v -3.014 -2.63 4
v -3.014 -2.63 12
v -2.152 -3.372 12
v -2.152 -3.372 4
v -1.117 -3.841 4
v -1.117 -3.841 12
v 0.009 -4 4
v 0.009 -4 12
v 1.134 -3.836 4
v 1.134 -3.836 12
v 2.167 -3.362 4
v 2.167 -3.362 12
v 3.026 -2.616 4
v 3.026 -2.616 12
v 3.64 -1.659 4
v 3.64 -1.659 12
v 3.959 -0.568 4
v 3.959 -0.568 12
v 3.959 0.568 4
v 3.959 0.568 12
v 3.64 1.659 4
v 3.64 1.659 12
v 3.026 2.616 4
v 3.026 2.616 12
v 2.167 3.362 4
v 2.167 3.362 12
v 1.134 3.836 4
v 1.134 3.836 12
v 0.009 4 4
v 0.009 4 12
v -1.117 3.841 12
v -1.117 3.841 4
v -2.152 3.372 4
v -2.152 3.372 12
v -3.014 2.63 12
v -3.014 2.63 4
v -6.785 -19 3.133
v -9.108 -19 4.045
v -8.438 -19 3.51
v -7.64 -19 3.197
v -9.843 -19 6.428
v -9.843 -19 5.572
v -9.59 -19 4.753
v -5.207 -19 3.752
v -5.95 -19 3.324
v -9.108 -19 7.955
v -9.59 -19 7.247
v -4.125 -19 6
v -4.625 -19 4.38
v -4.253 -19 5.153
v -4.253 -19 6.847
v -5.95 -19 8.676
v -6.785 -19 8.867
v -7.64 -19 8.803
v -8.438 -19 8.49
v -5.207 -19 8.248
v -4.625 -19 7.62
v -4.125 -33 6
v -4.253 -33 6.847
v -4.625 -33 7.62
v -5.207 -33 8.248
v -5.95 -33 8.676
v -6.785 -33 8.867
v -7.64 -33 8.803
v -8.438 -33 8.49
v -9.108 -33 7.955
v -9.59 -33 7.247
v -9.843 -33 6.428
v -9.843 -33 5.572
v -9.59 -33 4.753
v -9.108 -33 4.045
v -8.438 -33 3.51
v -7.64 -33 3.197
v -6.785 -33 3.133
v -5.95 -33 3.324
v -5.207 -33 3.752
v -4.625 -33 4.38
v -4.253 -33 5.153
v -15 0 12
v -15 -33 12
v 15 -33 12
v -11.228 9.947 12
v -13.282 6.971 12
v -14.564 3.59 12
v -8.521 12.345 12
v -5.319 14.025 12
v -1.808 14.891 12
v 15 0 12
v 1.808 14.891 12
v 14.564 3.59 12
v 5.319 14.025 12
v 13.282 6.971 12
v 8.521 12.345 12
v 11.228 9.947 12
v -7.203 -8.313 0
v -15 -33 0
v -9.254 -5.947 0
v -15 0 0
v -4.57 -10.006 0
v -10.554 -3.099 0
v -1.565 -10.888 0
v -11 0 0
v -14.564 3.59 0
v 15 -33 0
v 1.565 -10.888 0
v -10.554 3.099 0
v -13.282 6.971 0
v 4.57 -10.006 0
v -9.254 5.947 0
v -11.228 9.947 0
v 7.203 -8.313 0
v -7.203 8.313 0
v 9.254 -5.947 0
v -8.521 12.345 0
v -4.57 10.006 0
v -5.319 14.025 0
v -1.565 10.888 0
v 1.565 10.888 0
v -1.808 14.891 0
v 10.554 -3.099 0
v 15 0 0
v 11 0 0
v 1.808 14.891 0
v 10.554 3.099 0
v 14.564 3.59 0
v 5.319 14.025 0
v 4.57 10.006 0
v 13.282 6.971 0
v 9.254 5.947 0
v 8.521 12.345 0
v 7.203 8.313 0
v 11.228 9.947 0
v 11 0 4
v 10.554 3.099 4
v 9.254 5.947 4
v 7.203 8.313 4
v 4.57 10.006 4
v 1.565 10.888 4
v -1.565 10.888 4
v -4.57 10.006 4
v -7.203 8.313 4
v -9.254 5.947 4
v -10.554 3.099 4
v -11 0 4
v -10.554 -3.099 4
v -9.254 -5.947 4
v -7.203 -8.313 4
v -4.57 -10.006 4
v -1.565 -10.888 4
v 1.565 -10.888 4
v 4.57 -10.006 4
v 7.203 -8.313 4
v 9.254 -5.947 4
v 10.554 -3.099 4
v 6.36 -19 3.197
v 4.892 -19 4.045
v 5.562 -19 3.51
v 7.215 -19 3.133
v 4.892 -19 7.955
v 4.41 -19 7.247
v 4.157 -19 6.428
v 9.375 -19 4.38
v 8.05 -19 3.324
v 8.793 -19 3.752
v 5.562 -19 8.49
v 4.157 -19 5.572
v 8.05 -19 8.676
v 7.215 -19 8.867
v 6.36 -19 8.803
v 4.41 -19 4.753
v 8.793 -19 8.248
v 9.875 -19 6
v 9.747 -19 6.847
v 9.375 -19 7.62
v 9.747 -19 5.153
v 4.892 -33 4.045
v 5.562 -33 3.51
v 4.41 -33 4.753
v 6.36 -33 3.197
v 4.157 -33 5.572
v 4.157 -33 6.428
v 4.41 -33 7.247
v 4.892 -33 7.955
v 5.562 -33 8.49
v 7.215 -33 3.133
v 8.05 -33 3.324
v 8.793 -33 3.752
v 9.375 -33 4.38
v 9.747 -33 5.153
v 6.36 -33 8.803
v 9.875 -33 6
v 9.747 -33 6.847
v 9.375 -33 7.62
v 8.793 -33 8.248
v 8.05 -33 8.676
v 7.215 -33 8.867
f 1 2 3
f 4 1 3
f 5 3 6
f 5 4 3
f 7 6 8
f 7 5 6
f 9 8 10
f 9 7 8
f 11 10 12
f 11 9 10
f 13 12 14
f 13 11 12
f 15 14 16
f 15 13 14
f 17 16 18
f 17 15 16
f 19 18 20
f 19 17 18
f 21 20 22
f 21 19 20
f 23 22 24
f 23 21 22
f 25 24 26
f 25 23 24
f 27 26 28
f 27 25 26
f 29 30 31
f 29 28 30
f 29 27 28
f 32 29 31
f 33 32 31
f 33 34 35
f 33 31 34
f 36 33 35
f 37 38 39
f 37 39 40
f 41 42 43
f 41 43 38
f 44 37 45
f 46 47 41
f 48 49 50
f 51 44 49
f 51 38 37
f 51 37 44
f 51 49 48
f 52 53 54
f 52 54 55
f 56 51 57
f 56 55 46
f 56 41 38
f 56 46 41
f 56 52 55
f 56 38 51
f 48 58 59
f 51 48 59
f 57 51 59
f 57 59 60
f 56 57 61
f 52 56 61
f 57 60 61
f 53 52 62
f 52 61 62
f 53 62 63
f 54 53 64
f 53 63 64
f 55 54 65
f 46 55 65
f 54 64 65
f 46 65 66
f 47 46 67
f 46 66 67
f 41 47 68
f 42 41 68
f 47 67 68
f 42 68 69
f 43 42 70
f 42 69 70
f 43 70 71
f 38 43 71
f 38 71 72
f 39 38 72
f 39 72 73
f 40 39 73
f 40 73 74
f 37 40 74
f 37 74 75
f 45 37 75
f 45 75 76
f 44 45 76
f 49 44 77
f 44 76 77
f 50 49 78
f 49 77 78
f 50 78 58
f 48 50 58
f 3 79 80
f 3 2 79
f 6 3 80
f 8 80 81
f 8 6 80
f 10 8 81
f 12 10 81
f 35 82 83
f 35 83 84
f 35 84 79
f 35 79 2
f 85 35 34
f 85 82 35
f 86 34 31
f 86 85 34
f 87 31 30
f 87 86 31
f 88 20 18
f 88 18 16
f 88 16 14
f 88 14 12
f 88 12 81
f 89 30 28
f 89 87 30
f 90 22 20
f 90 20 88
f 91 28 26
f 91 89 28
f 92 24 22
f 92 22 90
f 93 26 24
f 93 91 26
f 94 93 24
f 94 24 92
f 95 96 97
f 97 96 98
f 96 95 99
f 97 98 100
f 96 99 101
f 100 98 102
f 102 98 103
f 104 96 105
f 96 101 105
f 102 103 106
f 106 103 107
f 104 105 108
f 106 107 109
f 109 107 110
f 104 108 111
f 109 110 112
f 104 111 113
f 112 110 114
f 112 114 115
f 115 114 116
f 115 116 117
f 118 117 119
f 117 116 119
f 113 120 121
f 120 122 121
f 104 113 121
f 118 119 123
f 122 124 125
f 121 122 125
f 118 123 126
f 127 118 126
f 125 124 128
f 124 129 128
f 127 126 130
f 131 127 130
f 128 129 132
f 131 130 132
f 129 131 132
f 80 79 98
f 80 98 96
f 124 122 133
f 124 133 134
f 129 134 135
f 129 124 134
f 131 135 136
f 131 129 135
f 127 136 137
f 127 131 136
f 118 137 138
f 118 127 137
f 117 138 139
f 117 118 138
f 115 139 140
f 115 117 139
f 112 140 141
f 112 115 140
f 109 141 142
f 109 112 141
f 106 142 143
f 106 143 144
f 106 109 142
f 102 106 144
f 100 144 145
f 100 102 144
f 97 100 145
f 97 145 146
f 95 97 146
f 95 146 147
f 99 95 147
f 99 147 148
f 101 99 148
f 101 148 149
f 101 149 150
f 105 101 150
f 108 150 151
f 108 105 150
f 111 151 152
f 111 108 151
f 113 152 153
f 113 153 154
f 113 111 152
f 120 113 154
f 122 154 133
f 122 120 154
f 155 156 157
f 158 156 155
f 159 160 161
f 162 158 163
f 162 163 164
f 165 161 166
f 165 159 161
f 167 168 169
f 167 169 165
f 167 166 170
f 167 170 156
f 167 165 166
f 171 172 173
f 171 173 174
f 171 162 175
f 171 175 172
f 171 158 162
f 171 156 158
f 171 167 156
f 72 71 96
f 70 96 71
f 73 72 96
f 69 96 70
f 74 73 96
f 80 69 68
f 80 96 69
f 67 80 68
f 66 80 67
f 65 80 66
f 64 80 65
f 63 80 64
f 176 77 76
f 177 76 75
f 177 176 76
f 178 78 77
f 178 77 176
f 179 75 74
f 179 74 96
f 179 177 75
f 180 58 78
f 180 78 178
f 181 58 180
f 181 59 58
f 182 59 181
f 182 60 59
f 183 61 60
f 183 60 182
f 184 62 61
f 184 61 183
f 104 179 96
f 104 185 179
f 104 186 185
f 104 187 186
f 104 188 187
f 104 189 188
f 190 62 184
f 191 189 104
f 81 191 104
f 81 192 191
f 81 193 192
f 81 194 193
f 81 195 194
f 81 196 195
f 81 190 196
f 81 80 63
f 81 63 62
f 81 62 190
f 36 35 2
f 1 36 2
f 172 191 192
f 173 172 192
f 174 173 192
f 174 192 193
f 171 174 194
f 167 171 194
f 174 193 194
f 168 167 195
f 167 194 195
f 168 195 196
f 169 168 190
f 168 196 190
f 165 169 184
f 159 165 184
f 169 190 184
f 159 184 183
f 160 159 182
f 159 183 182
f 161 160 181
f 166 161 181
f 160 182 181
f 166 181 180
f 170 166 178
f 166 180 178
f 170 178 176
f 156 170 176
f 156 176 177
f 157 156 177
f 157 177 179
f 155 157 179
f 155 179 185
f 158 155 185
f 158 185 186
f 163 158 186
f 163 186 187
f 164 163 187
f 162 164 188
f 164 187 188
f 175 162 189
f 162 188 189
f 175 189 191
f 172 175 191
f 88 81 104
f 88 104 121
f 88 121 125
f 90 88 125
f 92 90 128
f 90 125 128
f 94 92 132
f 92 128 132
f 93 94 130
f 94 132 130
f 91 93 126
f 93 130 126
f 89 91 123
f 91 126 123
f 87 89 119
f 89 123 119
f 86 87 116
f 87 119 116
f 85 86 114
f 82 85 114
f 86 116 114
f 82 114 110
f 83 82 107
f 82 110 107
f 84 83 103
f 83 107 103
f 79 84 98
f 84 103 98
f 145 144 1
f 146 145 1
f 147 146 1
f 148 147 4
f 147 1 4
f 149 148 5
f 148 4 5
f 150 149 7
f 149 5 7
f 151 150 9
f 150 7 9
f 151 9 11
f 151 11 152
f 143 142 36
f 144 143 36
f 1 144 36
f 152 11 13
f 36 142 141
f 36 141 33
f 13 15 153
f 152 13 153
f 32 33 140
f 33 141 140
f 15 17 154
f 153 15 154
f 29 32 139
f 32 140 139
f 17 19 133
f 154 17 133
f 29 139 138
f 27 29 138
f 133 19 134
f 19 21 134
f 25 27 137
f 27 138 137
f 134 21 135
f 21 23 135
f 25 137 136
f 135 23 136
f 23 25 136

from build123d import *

# Parameters (mm, degrees)
SKETCH2_R           = 15
SKETCH2_R_2         = 11
BOSS_EXTRUDE1_DEPTH = 4
SKETCH3_R           = 15
SKETCH3_R_2         = 4
BOSS_EXTRUDE2_DEPTH = 8
BOSS_EXTRUDE5_DEPTH = 12
BOSS_EXTRUDE7_DEPTH = 8
SKETCH9_R           = 2.875
CUT_EXTRUDE1_DEPTH  = 14


with BuildPart() as part:
    # Sketch2 → Boss-Extrude1 (new body)
    with BuildSketch(Plane.XY):
        Circle(SKETCH2_R)
        Circle(SKETCH2_R_2, mode=Mode.SUBTRACT)
    extrude(amount=BOSS_EXTRUDE1_DEPTH)

    # Sketch3 → Boss-Extrude2 (add)
    with BuildSketch(Plane.XY.offset(4)):
        Circle(SKETCH3_R)
        Circle(SKETCH3_R_2, mode=Mode.SUBTRACT)
    extrude(amount=BOSS_EXTRUDE2_DEPTH)

    # Sketch6 → Boss-Extrude5 (add)
    with BuildSketch(Plane.XY.offset(12)):
        with BuildLine():
            Line((-15, 0), (-15, -33))
            Line((-15, -33), (15, -33))
            Line((15, -33), (15, 0))
            ThreePointArc((15, 0), (0, -15), (-15, 0))
        make_face()
    extrude(amount=-BOSS_EXTRUDE5_DEPTH)

    # Sketch8 → Boss-Extrude7 (add)
    with BuildSketch(Plane.XY.offset(12)):
        with BuildLine():
            Line((-3.013818176, 2.63), (-3.013818176, -2.63))
            ThreePointArc((-3.013818176, -2.63), (-4, 0), (-3.013818176, 2.63))
        make_face()
    extrude(amount=-BOSS_EXTRUDE7_DEPTH)

    # Sketch9 → Cut-Extrude1 (cut)
    with BuildSketch(Plane.XZ.offset(33)):
        with Locations((-7, 6)):
            Circle(SKETCH9_R)
        with Locations((7, 6)):
            Circle(SKETCH9_R)
    extrude(amount=-CUT_EXTRUDE1_DEPTH, mode=Mode.SUBTRACT)


solid = part.part
